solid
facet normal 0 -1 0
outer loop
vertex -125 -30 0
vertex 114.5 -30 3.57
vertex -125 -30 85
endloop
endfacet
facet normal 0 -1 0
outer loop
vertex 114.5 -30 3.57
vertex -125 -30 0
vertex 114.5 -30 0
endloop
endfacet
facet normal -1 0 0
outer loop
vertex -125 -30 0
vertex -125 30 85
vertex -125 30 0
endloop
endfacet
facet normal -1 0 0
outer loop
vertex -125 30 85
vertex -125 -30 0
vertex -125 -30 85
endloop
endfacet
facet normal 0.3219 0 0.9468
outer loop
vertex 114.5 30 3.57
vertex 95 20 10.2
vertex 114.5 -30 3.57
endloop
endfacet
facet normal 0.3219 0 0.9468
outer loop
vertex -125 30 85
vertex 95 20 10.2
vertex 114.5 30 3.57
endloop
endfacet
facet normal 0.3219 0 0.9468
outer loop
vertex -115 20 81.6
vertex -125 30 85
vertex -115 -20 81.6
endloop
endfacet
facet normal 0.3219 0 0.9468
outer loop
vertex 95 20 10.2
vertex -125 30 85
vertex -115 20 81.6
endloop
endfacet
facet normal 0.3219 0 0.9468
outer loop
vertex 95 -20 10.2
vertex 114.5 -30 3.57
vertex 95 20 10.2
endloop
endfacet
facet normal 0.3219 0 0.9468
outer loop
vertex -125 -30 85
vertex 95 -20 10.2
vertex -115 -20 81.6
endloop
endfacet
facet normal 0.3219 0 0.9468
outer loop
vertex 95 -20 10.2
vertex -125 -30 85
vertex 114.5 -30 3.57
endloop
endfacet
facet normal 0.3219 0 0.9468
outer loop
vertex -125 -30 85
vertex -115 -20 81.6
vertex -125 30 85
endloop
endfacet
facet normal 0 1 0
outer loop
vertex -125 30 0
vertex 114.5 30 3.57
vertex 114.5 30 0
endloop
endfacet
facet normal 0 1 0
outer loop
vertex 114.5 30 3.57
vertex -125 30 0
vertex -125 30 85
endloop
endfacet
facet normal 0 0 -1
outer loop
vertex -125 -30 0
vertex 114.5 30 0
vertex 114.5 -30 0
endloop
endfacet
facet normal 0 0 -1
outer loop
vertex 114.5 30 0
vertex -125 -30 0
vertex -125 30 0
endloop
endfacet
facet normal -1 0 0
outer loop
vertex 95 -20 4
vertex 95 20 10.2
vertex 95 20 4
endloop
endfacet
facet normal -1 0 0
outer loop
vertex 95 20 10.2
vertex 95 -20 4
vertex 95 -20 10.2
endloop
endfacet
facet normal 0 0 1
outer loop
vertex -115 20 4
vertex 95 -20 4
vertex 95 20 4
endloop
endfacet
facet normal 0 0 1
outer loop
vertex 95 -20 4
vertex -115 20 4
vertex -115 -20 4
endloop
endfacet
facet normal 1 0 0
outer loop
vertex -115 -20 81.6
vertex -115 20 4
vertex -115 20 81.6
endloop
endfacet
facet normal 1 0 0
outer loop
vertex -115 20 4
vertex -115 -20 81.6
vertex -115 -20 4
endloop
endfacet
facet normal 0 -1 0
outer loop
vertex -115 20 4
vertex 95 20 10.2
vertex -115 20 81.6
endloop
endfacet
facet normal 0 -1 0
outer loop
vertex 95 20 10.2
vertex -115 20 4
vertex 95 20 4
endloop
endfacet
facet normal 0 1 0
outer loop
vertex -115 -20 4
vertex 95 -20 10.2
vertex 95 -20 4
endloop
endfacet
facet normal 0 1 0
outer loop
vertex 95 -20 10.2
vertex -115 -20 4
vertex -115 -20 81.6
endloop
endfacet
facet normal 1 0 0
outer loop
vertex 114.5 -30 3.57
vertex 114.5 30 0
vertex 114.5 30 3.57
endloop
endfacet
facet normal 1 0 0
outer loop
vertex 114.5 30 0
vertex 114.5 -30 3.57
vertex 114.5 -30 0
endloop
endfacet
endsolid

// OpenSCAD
/*
Door stopper

Author:
- Daniel K. Schneider, TECFA, University of Geneva, April 2010

Copyright and credits:
- Attribution - Non-Commercial - Share Alike license.
  (http://creativecommons.org/licenses/by-nc-sa/3.0/)

Purpose:
- Stops doors from banging when it is windy :)
- Offer it as a 3D visiting card, publicity for programs, etc.

Usage:
- Add some text on top of the flat area. E.g. use Netfabb to create and to position the 3D letters, then merge with Meshlab (or buy Netfabb Pro).
- Add text underneath, or use the door_stopper_simple () module. Text underneath should stretch in both the x/y directions and have z=0 ! Else you will have too much overhang.
- I recommend using a fat, round font like Arial Rounded MT Bold
- For some kinds of buildings, you may have to adapt the OpenScad code, i.e. you can make it flatter or higher. e.g. for indoor use, a much flatter version also can do in most houses.
- Of course, you could make it shorter and narrower, but this will seriously limit printing readable text. If you make it much smaller, consider printing slowly with fine filament and reduced layer thickness.

Default values to use for text size and positioning
- Text height underneath = 3mm ; Z position = 0
- Text height on top = between 2 and 4 mm ; Z position = 7.5

Printing with the RapMan / skeinforge
- Printing is *much* easier with PLA since it doesn't warp, but PLA is not as solid as ABS.
- ABS will probably warp, so:
-- take the print bed off and sand it again
-- make a really sticky and large raft (3mm thickness and 15 mm extra margin) and print it slowly !
-- even then, be prepared to file away the rounded bottom or if it warps just be bit, accept that it will be rounded since that hasn't much impact on door stopping ;)
-- use a fan maybe, but then raise all temperatures by 5 or more (depending on how much your ventilator will cool), e.g. 243 for the raft and 256 for the rest.
- Use a good infill if you want it solid, e.g. 25 %
- Flow rate: about 450 for a 4mm layer thickness and 16 head speed.

*/ 


// ------------------------- Pick your module
// Comment/uncomment one

/*
translate([-125,-40,0]) {
    cube([250,80,30]);
}
translate([0,0,30]) {
    door_stopper ();
}
*/
door_stopper_simple ();

// -------------------------- door stopper with text underneath 

module door_stopper ()
{
    height = 80  ;
    length = 250 ;
    width= 80 ;
    half_width  = width / 2;
    
    borders = 10; // 1 cm on each side

    // params for bottom inset
    bottom_cube_length = length - 4 * borders;
    bottom_cube_width = width - 2 * borders;
    bottom_cube_height = 6.0 ; // 3mm in / 3mm outsite
    bottom_z = 0;

    // params for top inset
    top_cube_length = length - 4 * borders;
    top_cube_width  = width - 2 * borders;
    top_cube_height = height ;  // make it big enough // 25
    top_z = height/2 + 7.5 ; //  12.5 + 7.5 = 10 ; 10 - 2.5 = 7.5

    // param for tip
    tip_cut_pos = length/2 - 0.5;

    // param for top tip
    top_tip_pos = height + 0.5; 

    difference() {
	translate ([-length/2.0, 0, 0]) {
    	    polyhedron (	
	    		points = [[0, -half_width, height], [0, half_width, height], [0, half_width, 0], [0, -half_width, 0], [length, -half_width, 0], [length, half_width, 0]],
			faces = [[0,3,2], [0,2,1], [3,0,4], [1,2,5], [0,5,4], [0,1,5],  [5,2,4], [4,2,3], ]);
	}
	// bottom inset
	translate ([-1 * borders, 0, bottom_z]) {
	    # cube ([bottom_cube_length,
		     bottom_cube_width,
		     bottom_cube_height],
		    center=true) ;
	}
	// top inset
	translate ([-1 * borders, 0, top_z]) {
	    # cube ([top_cube_length,
		     top_cube_width,
		     top_cube_height],
		    center=true) ;
	}
	// cut of the top tip a bit
	translate ([-1 *length/2, 0, top_tip_pos]) {
	    # cube ([length,
		     width+2,
		     height / 2],
		    center=true) ;
	}
	// cut of the front tip a bit
	translate ([tip_cut_pos, 0, 0]) {
	    # cube ([20,
		   width + 1,
		   height],
		  center=true) ;
	}
    }	    
}


// -------------------------- door stopper without text underneath 

module door_stopper_simple ()
{
    height = 85  ;
    length = 250 ;
    width= 60 ;
    half_width  = width / 2;
    
    borders = 10; // 1 cm on each side

    top_cube_length = length - 4 * borders;
    top_cube_width  = width - 2 * borders;
    top_cube_height = height ;  // make it big enough
    top_z = height/2 + 4 ; // adjust manually ;)

    tip_cut_pos = length/2 - 0.5;

    difference() {
	translate ([-length/2.0, 0, 0]) {
    	    polyhedron (	
	    		points = [[0, -half_width, height], [0, half_width, height], [0, half_width, 0], [0, -half_width, 0], [length, -half_width, 0], [length, half_width, 0]],
			faces = [[0,3,2], [0,2,1], [3,0,4], [1,2,5], [0,5,4], [0,1,5],  [5,2,4], [4,2,3], ]);
	}

	// top inset
	translate ([-1 * borders, 0, top_z]) {
	    # cube ([top_cube_length,
		     top_cube_width,
		     top_cube_height],
		    center=true) ;
	}
	// cut of the tip a bit

	translate ([tip_cut_pos, 0, 0]) {
	    # cube ([20,
		     width + 1,
		     height],
		    center=true) ;
	}
    }
}
